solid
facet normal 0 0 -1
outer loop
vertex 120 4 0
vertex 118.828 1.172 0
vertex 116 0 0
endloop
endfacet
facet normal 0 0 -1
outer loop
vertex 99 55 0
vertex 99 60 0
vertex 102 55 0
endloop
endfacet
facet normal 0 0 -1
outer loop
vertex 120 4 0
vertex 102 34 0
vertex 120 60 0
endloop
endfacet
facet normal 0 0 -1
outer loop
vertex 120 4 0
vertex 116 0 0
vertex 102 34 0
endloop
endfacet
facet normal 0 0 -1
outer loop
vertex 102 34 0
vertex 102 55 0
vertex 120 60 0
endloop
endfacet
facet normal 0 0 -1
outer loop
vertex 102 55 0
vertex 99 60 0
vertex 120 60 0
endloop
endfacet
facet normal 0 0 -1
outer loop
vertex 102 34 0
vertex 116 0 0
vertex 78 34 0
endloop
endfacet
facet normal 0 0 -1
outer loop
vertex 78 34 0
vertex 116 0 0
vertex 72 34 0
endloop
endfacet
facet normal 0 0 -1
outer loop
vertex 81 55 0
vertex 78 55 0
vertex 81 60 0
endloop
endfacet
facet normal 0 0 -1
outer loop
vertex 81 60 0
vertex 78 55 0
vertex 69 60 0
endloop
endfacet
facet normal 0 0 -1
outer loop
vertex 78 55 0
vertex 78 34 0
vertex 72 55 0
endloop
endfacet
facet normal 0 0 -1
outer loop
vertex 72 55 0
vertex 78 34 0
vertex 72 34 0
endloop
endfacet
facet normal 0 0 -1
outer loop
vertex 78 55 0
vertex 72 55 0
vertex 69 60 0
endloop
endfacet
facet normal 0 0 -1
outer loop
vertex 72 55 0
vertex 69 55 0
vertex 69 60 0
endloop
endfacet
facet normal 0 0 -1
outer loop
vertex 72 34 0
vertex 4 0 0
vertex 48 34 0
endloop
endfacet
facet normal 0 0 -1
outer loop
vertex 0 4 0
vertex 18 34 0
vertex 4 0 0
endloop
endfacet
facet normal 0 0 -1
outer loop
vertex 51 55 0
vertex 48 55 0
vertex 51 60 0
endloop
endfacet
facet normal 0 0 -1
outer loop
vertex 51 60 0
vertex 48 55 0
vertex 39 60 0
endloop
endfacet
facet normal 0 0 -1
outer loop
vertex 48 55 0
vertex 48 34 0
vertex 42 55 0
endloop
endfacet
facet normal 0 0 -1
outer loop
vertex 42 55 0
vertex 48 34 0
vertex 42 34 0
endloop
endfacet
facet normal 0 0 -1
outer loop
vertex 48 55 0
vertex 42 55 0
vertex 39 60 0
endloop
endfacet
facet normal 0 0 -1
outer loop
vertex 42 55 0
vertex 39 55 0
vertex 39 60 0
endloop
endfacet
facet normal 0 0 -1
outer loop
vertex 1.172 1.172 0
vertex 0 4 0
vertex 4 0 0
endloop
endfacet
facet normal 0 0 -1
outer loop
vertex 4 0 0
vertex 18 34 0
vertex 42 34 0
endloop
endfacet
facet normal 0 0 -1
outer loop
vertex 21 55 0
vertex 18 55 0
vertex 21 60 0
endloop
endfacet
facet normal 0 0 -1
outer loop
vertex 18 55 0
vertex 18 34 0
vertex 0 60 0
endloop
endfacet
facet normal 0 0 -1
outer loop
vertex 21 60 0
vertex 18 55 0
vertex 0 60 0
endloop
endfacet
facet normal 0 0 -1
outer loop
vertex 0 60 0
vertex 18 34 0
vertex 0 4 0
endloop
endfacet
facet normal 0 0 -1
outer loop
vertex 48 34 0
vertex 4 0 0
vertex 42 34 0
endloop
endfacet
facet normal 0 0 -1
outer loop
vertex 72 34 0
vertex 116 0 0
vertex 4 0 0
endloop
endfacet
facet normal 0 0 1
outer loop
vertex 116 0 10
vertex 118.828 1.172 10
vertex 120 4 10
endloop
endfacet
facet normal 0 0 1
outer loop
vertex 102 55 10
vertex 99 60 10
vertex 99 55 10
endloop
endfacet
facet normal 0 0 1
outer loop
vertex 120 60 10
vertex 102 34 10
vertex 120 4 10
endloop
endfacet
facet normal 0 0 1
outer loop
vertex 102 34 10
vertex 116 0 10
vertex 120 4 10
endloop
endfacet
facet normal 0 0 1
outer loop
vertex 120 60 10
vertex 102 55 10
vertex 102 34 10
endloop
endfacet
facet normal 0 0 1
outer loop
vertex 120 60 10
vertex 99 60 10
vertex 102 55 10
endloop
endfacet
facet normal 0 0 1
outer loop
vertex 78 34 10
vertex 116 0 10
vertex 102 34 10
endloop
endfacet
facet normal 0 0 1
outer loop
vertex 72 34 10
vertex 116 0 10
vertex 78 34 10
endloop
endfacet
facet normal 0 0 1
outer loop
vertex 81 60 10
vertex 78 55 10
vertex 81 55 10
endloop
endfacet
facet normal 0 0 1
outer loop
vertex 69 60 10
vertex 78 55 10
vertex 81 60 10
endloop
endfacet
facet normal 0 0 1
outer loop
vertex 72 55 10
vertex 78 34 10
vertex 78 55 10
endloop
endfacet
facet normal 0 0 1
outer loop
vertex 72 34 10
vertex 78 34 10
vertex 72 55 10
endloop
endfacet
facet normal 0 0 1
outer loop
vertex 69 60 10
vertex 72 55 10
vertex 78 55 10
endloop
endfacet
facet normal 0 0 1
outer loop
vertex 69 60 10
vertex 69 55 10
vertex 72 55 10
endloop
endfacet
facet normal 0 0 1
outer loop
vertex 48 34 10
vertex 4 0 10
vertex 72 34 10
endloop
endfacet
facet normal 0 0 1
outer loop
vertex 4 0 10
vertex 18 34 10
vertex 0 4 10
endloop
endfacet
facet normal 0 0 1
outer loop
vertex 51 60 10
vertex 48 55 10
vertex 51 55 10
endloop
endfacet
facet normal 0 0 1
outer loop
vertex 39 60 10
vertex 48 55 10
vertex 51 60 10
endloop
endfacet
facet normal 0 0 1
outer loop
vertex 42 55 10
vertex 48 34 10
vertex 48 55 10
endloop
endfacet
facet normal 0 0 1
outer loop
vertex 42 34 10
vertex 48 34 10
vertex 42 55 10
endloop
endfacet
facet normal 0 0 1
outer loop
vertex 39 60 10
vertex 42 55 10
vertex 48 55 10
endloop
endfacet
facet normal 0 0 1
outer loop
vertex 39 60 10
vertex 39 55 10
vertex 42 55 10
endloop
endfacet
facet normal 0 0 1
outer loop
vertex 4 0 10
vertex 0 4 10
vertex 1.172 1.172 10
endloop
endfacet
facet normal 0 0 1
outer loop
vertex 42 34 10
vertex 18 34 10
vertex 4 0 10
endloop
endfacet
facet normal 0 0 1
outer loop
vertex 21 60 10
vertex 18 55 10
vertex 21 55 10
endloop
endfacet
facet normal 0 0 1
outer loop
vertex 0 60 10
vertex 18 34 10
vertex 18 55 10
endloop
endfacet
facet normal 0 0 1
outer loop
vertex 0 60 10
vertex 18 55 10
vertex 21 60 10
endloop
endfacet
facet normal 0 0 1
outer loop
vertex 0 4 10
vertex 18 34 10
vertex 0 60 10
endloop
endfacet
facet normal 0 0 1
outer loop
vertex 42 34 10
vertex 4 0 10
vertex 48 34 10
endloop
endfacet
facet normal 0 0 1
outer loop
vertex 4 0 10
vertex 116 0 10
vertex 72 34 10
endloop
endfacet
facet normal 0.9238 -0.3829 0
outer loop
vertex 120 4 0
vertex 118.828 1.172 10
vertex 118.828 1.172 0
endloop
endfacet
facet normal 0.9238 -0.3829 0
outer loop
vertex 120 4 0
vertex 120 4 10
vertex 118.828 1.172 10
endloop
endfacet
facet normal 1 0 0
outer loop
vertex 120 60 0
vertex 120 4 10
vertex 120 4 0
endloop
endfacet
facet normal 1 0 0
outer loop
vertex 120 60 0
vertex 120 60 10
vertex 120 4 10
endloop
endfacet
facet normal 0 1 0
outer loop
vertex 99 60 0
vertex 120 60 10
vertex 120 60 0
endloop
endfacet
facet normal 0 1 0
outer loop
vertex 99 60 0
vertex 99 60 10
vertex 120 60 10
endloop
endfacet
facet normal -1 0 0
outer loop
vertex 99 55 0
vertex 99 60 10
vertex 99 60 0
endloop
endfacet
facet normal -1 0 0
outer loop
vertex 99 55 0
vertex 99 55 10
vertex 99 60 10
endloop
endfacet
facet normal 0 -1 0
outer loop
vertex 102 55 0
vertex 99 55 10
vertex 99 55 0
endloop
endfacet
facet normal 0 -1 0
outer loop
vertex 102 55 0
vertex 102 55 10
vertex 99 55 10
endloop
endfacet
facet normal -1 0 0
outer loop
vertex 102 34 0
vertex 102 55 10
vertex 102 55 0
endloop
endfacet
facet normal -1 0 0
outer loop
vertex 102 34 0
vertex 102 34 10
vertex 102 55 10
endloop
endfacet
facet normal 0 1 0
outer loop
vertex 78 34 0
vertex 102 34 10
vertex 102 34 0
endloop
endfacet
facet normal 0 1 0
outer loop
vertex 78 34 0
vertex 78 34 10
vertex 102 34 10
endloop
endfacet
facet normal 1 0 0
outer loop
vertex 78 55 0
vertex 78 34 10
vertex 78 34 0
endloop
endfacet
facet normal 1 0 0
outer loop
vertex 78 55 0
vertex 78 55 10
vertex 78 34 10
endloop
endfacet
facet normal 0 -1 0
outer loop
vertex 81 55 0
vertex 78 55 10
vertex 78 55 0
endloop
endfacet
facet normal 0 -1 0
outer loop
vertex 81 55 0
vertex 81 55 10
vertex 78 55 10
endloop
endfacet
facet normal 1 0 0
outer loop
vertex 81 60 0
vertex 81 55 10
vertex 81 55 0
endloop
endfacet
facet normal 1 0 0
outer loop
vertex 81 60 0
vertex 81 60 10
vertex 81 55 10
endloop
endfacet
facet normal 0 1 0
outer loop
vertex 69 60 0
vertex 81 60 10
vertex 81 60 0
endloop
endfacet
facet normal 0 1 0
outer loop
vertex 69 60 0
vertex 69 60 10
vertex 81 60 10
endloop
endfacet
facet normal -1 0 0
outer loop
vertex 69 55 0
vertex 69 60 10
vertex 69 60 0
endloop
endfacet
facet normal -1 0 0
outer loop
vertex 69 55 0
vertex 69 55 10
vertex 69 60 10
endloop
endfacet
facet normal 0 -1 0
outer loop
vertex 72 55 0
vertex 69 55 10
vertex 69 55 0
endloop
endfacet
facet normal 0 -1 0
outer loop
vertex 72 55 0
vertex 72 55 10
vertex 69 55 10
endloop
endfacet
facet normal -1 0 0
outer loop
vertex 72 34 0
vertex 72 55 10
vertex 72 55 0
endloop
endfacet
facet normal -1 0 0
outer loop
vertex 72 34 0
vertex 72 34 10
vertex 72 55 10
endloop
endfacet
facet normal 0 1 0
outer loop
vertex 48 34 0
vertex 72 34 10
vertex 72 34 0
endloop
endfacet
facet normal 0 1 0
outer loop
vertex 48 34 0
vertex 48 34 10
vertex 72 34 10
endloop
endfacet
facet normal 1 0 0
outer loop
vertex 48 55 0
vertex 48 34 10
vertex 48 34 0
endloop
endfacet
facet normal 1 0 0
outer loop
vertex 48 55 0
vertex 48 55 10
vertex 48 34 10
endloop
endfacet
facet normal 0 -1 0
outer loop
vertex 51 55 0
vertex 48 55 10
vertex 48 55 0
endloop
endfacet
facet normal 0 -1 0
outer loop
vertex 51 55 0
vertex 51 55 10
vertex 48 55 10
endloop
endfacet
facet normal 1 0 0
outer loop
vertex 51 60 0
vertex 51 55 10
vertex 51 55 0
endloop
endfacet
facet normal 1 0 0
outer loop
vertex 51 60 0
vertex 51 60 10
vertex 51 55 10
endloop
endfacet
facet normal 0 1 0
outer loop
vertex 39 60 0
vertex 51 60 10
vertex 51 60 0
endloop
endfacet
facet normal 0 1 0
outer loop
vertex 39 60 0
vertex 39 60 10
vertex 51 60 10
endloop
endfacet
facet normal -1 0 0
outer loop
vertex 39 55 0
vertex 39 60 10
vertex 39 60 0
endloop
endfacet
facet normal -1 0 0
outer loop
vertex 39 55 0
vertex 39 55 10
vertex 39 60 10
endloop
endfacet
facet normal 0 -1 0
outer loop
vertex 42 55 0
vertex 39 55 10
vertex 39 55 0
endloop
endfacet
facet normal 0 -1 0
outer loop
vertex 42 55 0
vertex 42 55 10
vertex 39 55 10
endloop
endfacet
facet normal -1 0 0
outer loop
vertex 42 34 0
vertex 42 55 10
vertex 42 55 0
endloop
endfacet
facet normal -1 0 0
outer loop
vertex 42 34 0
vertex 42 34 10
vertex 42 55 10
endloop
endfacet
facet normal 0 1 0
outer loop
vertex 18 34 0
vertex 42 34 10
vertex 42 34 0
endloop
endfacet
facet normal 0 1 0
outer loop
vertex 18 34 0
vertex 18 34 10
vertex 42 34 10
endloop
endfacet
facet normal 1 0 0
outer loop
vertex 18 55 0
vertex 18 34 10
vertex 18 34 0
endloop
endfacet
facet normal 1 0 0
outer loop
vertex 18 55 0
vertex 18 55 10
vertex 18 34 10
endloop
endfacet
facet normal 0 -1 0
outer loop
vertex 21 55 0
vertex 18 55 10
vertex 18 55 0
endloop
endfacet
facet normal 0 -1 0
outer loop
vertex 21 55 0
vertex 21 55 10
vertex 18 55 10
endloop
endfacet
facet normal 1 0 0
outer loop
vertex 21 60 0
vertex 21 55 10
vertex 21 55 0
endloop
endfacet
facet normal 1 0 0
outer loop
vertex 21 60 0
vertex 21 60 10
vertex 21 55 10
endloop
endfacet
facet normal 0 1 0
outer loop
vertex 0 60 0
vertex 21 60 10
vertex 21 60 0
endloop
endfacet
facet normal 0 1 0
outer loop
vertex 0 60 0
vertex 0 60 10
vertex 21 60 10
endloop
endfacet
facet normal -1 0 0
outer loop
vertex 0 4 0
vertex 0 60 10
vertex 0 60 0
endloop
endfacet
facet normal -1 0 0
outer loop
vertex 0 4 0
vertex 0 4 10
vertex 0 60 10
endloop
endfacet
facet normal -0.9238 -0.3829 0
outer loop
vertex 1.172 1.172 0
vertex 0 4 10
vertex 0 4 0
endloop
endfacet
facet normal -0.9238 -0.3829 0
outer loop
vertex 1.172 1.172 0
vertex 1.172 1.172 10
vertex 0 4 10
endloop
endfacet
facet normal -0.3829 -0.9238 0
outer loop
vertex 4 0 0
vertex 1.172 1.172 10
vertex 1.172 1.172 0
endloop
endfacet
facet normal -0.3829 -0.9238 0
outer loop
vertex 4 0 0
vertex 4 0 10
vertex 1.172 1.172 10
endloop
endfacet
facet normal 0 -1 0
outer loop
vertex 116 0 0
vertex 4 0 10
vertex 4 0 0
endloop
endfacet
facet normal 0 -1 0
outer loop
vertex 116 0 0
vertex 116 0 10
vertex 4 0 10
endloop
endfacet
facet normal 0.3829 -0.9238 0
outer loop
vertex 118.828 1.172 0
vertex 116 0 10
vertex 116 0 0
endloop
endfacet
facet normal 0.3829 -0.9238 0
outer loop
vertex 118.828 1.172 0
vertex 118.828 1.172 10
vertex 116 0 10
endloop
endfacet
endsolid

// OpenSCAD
$fn = 32;

// ----------------------------------------------------------------------
// Oversize slot bar: 120 mm bar with 3 oversize windows
// ----------------------------------------------------------------------

// --- parameters (mm) ---
profile_height = 10;      // extrusion height
profile_points = 32;      // points of the closed outline

profile = [[0, 4], [1.172, 1.172], [4, 0], [116, 0], [118.828, 1.172], [120, 4], [120, 60], [99, 60], [99, 55], [102, 55], [102, 34], [78, 34], [78, 55], [81, 55], [81, 60], [69, 60], [69, 55], [72, 55], [72, 34], [48, 34], [48, 55], [51, 55], [51, 60], [39, 60], [39, 55], [42, 55], [42, 34], [18, 34], [18, 55], [21, 55], [21, 60], [0, 60]];  // single closed polygon, 32 points, counter clockwise

// --- the one profile operation ---
linear_extrude(height = profile_height) polygon(points = profile);
